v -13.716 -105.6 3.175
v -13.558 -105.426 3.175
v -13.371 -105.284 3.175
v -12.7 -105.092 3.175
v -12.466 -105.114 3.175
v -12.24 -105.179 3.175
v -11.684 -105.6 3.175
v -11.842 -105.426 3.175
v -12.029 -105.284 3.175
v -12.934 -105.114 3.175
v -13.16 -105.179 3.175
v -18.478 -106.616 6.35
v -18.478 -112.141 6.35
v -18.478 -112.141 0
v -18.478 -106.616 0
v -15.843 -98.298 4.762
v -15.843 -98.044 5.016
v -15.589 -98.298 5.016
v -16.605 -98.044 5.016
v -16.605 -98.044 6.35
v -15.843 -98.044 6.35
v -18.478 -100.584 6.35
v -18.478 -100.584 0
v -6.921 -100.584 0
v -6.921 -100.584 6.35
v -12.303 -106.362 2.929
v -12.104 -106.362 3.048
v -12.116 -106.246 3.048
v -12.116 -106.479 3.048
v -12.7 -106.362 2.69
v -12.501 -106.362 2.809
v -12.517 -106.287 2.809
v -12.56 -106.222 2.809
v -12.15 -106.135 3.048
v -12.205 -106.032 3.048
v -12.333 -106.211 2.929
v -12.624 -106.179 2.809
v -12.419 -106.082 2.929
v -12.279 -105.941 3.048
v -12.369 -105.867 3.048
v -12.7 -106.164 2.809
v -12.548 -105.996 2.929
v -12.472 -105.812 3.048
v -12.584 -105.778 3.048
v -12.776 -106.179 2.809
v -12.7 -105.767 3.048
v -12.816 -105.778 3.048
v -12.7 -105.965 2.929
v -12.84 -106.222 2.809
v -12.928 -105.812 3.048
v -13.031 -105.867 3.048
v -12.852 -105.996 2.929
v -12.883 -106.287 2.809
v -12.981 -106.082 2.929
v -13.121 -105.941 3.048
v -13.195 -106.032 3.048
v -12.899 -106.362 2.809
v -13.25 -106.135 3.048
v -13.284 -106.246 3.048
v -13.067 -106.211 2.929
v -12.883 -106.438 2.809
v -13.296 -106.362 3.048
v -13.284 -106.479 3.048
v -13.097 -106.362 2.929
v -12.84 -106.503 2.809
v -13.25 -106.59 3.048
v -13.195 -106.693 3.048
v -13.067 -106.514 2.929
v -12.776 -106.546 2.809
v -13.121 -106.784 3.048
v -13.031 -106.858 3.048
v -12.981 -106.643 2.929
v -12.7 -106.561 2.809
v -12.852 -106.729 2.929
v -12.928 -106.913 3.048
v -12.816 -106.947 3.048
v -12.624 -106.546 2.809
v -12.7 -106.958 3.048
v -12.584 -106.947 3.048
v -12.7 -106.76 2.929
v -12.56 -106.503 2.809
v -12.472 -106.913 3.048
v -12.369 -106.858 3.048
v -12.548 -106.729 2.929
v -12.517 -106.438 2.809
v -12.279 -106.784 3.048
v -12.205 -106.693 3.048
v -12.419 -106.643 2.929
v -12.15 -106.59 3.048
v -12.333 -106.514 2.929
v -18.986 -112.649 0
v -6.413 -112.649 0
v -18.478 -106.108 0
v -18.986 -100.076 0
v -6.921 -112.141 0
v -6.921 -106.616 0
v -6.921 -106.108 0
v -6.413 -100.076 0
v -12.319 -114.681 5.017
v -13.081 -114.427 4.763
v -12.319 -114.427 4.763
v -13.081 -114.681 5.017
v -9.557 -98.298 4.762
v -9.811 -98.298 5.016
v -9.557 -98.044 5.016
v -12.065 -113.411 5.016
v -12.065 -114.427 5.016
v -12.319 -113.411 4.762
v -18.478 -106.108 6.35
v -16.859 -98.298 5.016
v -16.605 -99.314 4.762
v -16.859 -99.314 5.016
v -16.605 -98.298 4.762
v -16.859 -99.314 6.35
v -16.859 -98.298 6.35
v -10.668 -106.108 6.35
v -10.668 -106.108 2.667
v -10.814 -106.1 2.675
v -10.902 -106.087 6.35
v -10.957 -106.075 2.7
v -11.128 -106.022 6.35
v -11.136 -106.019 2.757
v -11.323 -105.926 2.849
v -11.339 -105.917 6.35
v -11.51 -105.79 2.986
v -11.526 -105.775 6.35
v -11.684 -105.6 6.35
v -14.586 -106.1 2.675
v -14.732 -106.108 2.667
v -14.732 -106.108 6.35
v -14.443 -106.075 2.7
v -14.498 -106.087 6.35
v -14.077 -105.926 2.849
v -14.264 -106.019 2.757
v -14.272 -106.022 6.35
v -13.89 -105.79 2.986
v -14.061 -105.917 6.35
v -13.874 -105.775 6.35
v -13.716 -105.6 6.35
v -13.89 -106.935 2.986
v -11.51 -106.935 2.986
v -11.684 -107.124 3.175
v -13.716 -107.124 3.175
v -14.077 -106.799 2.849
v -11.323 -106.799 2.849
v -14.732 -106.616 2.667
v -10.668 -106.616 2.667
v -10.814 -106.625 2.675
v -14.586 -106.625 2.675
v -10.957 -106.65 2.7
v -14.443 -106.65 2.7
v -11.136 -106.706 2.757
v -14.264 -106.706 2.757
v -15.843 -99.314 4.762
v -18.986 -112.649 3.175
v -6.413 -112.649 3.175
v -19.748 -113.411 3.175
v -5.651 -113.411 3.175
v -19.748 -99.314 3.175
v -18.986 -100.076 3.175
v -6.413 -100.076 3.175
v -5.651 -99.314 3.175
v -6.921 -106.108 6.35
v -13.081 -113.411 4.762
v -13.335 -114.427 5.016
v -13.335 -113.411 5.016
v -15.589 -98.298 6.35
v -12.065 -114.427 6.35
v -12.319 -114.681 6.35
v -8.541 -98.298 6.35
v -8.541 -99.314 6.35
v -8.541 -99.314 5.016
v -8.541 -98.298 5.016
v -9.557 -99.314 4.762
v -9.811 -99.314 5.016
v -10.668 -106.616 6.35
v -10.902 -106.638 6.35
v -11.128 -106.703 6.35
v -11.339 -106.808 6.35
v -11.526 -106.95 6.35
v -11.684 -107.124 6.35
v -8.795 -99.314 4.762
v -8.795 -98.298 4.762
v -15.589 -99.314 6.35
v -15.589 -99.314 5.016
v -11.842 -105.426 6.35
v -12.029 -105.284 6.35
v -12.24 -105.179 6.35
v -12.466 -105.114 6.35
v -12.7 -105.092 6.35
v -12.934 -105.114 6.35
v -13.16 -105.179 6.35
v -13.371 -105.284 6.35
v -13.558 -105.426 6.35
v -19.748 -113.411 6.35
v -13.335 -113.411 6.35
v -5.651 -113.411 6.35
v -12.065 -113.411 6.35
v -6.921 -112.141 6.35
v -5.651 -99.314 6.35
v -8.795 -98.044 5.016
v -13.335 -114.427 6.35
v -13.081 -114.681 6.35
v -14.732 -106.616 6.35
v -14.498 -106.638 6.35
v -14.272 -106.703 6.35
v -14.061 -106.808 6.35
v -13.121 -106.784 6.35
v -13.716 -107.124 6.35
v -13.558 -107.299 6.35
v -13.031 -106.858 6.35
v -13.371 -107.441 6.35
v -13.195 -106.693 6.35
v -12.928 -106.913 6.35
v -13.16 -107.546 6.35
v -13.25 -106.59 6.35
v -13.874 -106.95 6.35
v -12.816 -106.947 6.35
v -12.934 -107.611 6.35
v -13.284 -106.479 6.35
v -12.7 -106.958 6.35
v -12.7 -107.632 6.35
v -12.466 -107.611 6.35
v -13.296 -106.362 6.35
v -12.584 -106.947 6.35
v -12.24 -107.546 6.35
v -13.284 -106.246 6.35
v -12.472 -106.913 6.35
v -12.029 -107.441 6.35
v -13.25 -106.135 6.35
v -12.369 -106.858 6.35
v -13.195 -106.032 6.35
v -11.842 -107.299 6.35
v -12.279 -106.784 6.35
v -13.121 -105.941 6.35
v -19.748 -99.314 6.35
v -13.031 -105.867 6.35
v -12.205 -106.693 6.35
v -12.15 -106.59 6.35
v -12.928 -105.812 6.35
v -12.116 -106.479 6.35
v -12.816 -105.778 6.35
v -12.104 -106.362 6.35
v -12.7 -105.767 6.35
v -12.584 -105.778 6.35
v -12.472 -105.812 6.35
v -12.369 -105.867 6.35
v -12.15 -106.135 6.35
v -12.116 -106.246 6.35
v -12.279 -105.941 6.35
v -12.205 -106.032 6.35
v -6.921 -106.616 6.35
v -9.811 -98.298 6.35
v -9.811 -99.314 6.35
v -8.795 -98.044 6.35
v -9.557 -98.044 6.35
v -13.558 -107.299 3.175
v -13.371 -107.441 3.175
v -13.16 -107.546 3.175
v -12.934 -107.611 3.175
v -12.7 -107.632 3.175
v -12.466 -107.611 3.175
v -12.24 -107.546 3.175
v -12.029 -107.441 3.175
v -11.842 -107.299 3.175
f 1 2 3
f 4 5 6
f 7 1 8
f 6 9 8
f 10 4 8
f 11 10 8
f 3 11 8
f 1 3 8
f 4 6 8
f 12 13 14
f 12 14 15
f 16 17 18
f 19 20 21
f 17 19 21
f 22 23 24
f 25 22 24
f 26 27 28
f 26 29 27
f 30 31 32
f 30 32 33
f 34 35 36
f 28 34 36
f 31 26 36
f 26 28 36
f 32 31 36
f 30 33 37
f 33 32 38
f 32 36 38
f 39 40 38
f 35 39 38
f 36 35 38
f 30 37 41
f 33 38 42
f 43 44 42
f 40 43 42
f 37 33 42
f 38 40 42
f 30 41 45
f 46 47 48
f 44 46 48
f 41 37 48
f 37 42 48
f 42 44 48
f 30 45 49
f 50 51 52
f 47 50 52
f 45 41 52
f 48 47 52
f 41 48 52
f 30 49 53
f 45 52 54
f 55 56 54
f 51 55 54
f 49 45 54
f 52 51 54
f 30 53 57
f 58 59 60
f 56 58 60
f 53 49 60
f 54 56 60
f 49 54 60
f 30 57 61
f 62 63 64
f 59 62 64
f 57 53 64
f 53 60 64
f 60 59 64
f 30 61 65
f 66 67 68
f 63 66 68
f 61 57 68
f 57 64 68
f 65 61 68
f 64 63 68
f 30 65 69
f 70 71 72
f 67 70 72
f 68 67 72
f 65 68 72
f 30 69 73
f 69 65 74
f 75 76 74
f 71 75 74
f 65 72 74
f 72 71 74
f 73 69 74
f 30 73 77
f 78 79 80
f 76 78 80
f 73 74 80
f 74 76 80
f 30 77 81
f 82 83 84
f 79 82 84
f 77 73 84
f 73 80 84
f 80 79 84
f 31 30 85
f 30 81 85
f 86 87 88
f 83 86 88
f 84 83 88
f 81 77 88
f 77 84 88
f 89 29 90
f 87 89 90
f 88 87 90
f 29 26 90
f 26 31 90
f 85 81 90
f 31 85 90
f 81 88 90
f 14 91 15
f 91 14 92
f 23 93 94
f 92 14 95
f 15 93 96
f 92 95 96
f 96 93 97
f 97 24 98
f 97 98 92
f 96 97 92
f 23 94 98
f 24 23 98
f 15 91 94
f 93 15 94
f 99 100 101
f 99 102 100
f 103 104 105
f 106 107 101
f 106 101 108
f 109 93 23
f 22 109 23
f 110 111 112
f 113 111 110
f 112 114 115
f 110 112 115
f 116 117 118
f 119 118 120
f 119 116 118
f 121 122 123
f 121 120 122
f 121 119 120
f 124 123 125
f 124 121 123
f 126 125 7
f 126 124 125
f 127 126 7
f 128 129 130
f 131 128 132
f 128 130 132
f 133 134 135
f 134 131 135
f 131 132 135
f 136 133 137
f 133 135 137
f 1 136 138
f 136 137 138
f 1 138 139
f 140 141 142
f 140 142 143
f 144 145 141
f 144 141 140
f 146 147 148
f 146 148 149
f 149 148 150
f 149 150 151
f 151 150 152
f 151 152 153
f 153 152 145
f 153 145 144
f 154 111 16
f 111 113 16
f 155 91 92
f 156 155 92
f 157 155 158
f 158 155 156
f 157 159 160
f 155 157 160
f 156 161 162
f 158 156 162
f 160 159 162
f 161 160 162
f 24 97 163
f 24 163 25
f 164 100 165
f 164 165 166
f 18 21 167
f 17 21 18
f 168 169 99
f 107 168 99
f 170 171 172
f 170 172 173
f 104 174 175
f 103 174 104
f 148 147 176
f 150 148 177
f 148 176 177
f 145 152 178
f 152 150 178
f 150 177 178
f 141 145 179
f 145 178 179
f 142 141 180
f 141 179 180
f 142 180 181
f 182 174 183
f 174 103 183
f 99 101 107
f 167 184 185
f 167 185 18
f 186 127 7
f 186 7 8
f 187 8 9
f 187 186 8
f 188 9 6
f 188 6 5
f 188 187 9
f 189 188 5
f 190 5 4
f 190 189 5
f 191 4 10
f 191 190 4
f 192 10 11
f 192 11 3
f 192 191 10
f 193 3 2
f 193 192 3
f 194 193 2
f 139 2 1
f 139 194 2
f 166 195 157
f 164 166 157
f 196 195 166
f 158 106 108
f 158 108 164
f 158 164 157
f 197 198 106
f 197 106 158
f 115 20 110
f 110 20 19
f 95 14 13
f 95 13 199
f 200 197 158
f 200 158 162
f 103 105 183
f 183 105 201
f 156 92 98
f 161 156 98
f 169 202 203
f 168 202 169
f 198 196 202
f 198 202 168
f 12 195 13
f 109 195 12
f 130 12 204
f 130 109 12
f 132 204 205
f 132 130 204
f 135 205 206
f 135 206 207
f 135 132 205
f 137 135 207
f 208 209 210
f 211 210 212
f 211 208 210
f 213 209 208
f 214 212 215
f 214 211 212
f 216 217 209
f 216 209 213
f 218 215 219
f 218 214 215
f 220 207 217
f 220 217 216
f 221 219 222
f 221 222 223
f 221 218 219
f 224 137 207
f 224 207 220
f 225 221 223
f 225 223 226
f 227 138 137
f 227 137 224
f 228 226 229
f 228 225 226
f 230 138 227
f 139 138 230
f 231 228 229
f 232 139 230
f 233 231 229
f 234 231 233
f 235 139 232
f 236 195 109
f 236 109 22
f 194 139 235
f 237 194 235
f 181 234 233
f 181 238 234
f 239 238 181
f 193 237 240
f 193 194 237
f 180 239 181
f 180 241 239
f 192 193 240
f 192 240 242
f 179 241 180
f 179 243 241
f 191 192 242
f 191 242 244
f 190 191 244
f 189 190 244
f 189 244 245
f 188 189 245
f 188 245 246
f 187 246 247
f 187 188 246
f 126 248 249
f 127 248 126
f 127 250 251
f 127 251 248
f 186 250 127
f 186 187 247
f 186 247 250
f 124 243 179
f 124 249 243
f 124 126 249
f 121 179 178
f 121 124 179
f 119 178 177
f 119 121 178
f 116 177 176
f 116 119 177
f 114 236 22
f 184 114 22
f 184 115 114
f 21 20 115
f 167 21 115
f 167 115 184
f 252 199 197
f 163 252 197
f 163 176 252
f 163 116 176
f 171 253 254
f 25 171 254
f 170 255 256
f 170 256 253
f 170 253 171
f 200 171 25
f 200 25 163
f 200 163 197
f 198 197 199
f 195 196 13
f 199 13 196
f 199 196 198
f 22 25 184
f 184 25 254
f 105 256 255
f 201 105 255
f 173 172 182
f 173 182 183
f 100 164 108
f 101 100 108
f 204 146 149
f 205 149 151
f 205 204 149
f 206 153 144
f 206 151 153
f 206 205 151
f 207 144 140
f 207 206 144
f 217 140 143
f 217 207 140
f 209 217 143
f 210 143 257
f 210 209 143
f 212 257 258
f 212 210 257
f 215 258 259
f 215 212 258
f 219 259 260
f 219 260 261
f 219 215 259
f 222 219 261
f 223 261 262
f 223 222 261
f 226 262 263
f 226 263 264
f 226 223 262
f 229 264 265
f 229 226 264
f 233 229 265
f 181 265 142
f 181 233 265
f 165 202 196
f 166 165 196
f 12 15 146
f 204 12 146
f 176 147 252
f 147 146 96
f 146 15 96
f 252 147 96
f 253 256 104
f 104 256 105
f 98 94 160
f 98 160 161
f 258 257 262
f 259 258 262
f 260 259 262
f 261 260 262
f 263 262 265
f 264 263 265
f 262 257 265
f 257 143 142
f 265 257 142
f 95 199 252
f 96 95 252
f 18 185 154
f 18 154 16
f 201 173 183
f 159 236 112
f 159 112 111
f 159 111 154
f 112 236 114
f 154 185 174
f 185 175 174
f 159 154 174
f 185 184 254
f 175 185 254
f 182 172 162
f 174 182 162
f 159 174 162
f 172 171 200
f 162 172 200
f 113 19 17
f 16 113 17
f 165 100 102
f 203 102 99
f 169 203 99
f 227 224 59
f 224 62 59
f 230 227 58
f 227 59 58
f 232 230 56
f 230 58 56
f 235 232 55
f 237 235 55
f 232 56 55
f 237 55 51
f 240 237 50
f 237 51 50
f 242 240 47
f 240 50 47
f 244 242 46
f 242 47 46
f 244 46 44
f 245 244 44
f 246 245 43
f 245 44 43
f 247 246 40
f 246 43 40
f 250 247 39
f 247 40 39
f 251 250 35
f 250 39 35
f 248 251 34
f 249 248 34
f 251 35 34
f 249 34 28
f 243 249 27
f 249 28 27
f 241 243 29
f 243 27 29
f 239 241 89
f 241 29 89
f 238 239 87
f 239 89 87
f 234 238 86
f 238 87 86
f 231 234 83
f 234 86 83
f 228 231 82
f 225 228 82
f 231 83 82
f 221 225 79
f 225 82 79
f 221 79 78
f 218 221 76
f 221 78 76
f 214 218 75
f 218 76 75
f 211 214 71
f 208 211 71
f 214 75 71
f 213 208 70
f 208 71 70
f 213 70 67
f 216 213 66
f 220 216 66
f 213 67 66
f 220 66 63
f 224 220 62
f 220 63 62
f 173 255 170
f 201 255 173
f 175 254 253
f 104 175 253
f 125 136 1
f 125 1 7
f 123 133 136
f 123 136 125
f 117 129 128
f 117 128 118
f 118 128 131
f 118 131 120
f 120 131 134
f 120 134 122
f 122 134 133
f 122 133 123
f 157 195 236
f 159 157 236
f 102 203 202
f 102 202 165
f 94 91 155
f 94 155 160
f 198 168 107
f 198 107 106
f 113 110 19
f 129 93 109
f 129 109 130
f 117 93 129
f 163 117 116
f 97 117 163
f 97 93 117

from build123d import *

# Parameters (mm, degrees)
SKETCH1_W                 = 12.573
SKETCH1_H                 = 12.573
SKETCH1_W_2               = 11.557
SKETCH1_H_2               = 11.557
EXTRUDE_THIN1_DEPTH       = 6.35
SKETCH1_4_W               = 12.573
SKETCH1_4_H               = 0.508
EXTRUDE_THIN2_DEPTH       = 6.35
SKETCH2_W                 = 14.097
SKETCH2_H                 = 14.097
SKETCH2_W_2               = 12.573
SKETCH2_H_2               = 12.573
BOSS_EXTRUDE1_DEPTH       = 3.175
SKETCH3_R                 = 1.27
BOSS_EXTRUDE2_DEPTH       = 3.175
FILLET2_R                 = 1.27
CHAMFER1_SIZE             = 0.508
F_0_80_TAPPED_HOLE1_D     = 1.19126
F_0_80_TAPPED_HOLE1_DEPTH = 3.302
F_0_80_TAPPED_HOLE1_TIP   = 0.357890611
SKETCH6_W                 = 1.27
SKETCH6_H                 = 1.27
EXTRUDE_THIN3_DEPTH       = 1.5875
CHAMFER2_SIZE             = 0.254


with BuildPart() as part:
    # Sketch1 → Extrude-Thin1 (new body)
    with BuildSketch(Plane.XY):
        with Locations((-12.7, -106.3625)):
            Rectangle(SKETCH1_W, SKETCH1_H)
        with Locations((-12.7, -106.3625)):
            Rectangle(SKETCH1_W_2, SKETCH1_H_2, mode=Mode.SUBTRACT)
    extrude(amount=EXTRUDE_THIN1_DEPTH)

    # Sketch1<4> → Extrude-Thin2 (add, through all)
    with BuildSketch(Plane.XY):
        with Locations((-12.7, -106.3625)):
            Rectangle(SKETCH1_4_W, SKETCH1_4_H)
    extrude(amount=EXTRUDE_THIN2_DEPTH)

    # Sketch2 → Boss-Extrude1 (add)
    with BuildSketch(Plane.XY.offset(6.35)):
        with Locations((-12.7, -106.3625)):
            Rectangle(SKETCH2_W, SKETCH2_H)
        with Locations((-12.7, -106.3625)):
            Rectangle(SKETCH2_W_2, SKETCH2_H_2, mode=Mode.SUBTRACT)
    extrude(amount=-BOSS_EXTRUDE1_DEPTH)

    # Sketch3 → Boss-Extrude2 (add)
    with BuildSketch(Plane.XY.offset(6.35)):
        with Locations((-12.7, -106.3625)):
            Circle(SKETCH3_R)
    extrude(amount=-BOSS_EXTRUDE2_DEPTH)

    # Fillet2
    fillet2_edges = [part.edges().sort_by_distance(p)[0] for p in [
        (-13.944340789, -106.6165, 4.7625),
        (-11.455659211, -106.6165, 4.7625),
        (-11.455659211, -106.1085, 4.7625),
        (-13.944340789, -106.1085, 4.7625),
    ]]
    fillet(fillet2_edges, radius=FILLET2_R)

    # Chamfer1
    chamfer1_edges = [part.edges().sort_by_distance(p)[0] for p in [
        (-12.7, -106.6165, 3.175),
        (-12.7, -106.1085, 3.175),
    ]]
    chamfer(chamfer1_edges, length=CHAMFER1_SIZE)

    # #0-80 Tapped Hole1
    with Locations(Plane.XY.offset(6.35)):
        with Locations((-12.7, -106.3625)):
            Hole(F_0_80_TAPPED_HOLE1_D / 2, depth=F_0_80_TAPPED_HOLE1_DEPTH)
            with Locations((0, 0, -(F_0_80_TAPPED_HOLE1_DEPTH + F_0_80_TAPPED_HOLE1_TIP / 2))):  # 118° drill point
                Cone(0, F_0_80_TAPPED_HOLE1_D / 2, F_0_80_TAPPED_HOLE1_TIP, mode=Mode.SUBTRACT)

    # Sketch6 → Extrude-Thin3 (add)
    with BuildSketch(Plane.XY.offset(6.35)):
        with Locations((-12.7, -114.046)):
            Rectangle(SKETCH6_W, SKETCH6_H)
        with Locations((-9.17575, -98.679)):
            Rectangle(SKETCH6_W, SKETCH6_H)
        with Locations((-16.22425, -98.679)):
            Rectangle(SKETCH6_W, SKETCH6_H)
    extrude(amount=-EXTRUDE_THIN3_DEPTH)

    # Chamfer2
    chamfer2_edges = [part.edges().sort_by_distance(p)[0] for p in [
        (-12.7, -114.681, 4.7625),
        (-12.065, -114.046, 4.7625),
        (-13.335, -114.046, 4.7625),
        (-8.54075, -98.044, 5.55625),
        (-9.81075, -98.044, 5.55625),
        (-16.85925, -98.044, 5.55625),
        (-15.58925, -98.044, 5.55625),
        (-13.335, -114.681, 5.55625),
        (-12.065, -114.681, 5.55625),
        (-9.81075, -98.679, 4.7625),
        (-8.54075, -98.679, 4.7625),
        (-9.17575, -98.044, 4.7625),
        (-16.85925, -98.679, 4.7625),
        (-16.22425, -98.044, 4.7625),
        (-15.58925, -98.679, 4.7625),
    ]]
    chamfer(chamfer2_edges, length=CHAMFER2_SIZE)


solid = part.part
